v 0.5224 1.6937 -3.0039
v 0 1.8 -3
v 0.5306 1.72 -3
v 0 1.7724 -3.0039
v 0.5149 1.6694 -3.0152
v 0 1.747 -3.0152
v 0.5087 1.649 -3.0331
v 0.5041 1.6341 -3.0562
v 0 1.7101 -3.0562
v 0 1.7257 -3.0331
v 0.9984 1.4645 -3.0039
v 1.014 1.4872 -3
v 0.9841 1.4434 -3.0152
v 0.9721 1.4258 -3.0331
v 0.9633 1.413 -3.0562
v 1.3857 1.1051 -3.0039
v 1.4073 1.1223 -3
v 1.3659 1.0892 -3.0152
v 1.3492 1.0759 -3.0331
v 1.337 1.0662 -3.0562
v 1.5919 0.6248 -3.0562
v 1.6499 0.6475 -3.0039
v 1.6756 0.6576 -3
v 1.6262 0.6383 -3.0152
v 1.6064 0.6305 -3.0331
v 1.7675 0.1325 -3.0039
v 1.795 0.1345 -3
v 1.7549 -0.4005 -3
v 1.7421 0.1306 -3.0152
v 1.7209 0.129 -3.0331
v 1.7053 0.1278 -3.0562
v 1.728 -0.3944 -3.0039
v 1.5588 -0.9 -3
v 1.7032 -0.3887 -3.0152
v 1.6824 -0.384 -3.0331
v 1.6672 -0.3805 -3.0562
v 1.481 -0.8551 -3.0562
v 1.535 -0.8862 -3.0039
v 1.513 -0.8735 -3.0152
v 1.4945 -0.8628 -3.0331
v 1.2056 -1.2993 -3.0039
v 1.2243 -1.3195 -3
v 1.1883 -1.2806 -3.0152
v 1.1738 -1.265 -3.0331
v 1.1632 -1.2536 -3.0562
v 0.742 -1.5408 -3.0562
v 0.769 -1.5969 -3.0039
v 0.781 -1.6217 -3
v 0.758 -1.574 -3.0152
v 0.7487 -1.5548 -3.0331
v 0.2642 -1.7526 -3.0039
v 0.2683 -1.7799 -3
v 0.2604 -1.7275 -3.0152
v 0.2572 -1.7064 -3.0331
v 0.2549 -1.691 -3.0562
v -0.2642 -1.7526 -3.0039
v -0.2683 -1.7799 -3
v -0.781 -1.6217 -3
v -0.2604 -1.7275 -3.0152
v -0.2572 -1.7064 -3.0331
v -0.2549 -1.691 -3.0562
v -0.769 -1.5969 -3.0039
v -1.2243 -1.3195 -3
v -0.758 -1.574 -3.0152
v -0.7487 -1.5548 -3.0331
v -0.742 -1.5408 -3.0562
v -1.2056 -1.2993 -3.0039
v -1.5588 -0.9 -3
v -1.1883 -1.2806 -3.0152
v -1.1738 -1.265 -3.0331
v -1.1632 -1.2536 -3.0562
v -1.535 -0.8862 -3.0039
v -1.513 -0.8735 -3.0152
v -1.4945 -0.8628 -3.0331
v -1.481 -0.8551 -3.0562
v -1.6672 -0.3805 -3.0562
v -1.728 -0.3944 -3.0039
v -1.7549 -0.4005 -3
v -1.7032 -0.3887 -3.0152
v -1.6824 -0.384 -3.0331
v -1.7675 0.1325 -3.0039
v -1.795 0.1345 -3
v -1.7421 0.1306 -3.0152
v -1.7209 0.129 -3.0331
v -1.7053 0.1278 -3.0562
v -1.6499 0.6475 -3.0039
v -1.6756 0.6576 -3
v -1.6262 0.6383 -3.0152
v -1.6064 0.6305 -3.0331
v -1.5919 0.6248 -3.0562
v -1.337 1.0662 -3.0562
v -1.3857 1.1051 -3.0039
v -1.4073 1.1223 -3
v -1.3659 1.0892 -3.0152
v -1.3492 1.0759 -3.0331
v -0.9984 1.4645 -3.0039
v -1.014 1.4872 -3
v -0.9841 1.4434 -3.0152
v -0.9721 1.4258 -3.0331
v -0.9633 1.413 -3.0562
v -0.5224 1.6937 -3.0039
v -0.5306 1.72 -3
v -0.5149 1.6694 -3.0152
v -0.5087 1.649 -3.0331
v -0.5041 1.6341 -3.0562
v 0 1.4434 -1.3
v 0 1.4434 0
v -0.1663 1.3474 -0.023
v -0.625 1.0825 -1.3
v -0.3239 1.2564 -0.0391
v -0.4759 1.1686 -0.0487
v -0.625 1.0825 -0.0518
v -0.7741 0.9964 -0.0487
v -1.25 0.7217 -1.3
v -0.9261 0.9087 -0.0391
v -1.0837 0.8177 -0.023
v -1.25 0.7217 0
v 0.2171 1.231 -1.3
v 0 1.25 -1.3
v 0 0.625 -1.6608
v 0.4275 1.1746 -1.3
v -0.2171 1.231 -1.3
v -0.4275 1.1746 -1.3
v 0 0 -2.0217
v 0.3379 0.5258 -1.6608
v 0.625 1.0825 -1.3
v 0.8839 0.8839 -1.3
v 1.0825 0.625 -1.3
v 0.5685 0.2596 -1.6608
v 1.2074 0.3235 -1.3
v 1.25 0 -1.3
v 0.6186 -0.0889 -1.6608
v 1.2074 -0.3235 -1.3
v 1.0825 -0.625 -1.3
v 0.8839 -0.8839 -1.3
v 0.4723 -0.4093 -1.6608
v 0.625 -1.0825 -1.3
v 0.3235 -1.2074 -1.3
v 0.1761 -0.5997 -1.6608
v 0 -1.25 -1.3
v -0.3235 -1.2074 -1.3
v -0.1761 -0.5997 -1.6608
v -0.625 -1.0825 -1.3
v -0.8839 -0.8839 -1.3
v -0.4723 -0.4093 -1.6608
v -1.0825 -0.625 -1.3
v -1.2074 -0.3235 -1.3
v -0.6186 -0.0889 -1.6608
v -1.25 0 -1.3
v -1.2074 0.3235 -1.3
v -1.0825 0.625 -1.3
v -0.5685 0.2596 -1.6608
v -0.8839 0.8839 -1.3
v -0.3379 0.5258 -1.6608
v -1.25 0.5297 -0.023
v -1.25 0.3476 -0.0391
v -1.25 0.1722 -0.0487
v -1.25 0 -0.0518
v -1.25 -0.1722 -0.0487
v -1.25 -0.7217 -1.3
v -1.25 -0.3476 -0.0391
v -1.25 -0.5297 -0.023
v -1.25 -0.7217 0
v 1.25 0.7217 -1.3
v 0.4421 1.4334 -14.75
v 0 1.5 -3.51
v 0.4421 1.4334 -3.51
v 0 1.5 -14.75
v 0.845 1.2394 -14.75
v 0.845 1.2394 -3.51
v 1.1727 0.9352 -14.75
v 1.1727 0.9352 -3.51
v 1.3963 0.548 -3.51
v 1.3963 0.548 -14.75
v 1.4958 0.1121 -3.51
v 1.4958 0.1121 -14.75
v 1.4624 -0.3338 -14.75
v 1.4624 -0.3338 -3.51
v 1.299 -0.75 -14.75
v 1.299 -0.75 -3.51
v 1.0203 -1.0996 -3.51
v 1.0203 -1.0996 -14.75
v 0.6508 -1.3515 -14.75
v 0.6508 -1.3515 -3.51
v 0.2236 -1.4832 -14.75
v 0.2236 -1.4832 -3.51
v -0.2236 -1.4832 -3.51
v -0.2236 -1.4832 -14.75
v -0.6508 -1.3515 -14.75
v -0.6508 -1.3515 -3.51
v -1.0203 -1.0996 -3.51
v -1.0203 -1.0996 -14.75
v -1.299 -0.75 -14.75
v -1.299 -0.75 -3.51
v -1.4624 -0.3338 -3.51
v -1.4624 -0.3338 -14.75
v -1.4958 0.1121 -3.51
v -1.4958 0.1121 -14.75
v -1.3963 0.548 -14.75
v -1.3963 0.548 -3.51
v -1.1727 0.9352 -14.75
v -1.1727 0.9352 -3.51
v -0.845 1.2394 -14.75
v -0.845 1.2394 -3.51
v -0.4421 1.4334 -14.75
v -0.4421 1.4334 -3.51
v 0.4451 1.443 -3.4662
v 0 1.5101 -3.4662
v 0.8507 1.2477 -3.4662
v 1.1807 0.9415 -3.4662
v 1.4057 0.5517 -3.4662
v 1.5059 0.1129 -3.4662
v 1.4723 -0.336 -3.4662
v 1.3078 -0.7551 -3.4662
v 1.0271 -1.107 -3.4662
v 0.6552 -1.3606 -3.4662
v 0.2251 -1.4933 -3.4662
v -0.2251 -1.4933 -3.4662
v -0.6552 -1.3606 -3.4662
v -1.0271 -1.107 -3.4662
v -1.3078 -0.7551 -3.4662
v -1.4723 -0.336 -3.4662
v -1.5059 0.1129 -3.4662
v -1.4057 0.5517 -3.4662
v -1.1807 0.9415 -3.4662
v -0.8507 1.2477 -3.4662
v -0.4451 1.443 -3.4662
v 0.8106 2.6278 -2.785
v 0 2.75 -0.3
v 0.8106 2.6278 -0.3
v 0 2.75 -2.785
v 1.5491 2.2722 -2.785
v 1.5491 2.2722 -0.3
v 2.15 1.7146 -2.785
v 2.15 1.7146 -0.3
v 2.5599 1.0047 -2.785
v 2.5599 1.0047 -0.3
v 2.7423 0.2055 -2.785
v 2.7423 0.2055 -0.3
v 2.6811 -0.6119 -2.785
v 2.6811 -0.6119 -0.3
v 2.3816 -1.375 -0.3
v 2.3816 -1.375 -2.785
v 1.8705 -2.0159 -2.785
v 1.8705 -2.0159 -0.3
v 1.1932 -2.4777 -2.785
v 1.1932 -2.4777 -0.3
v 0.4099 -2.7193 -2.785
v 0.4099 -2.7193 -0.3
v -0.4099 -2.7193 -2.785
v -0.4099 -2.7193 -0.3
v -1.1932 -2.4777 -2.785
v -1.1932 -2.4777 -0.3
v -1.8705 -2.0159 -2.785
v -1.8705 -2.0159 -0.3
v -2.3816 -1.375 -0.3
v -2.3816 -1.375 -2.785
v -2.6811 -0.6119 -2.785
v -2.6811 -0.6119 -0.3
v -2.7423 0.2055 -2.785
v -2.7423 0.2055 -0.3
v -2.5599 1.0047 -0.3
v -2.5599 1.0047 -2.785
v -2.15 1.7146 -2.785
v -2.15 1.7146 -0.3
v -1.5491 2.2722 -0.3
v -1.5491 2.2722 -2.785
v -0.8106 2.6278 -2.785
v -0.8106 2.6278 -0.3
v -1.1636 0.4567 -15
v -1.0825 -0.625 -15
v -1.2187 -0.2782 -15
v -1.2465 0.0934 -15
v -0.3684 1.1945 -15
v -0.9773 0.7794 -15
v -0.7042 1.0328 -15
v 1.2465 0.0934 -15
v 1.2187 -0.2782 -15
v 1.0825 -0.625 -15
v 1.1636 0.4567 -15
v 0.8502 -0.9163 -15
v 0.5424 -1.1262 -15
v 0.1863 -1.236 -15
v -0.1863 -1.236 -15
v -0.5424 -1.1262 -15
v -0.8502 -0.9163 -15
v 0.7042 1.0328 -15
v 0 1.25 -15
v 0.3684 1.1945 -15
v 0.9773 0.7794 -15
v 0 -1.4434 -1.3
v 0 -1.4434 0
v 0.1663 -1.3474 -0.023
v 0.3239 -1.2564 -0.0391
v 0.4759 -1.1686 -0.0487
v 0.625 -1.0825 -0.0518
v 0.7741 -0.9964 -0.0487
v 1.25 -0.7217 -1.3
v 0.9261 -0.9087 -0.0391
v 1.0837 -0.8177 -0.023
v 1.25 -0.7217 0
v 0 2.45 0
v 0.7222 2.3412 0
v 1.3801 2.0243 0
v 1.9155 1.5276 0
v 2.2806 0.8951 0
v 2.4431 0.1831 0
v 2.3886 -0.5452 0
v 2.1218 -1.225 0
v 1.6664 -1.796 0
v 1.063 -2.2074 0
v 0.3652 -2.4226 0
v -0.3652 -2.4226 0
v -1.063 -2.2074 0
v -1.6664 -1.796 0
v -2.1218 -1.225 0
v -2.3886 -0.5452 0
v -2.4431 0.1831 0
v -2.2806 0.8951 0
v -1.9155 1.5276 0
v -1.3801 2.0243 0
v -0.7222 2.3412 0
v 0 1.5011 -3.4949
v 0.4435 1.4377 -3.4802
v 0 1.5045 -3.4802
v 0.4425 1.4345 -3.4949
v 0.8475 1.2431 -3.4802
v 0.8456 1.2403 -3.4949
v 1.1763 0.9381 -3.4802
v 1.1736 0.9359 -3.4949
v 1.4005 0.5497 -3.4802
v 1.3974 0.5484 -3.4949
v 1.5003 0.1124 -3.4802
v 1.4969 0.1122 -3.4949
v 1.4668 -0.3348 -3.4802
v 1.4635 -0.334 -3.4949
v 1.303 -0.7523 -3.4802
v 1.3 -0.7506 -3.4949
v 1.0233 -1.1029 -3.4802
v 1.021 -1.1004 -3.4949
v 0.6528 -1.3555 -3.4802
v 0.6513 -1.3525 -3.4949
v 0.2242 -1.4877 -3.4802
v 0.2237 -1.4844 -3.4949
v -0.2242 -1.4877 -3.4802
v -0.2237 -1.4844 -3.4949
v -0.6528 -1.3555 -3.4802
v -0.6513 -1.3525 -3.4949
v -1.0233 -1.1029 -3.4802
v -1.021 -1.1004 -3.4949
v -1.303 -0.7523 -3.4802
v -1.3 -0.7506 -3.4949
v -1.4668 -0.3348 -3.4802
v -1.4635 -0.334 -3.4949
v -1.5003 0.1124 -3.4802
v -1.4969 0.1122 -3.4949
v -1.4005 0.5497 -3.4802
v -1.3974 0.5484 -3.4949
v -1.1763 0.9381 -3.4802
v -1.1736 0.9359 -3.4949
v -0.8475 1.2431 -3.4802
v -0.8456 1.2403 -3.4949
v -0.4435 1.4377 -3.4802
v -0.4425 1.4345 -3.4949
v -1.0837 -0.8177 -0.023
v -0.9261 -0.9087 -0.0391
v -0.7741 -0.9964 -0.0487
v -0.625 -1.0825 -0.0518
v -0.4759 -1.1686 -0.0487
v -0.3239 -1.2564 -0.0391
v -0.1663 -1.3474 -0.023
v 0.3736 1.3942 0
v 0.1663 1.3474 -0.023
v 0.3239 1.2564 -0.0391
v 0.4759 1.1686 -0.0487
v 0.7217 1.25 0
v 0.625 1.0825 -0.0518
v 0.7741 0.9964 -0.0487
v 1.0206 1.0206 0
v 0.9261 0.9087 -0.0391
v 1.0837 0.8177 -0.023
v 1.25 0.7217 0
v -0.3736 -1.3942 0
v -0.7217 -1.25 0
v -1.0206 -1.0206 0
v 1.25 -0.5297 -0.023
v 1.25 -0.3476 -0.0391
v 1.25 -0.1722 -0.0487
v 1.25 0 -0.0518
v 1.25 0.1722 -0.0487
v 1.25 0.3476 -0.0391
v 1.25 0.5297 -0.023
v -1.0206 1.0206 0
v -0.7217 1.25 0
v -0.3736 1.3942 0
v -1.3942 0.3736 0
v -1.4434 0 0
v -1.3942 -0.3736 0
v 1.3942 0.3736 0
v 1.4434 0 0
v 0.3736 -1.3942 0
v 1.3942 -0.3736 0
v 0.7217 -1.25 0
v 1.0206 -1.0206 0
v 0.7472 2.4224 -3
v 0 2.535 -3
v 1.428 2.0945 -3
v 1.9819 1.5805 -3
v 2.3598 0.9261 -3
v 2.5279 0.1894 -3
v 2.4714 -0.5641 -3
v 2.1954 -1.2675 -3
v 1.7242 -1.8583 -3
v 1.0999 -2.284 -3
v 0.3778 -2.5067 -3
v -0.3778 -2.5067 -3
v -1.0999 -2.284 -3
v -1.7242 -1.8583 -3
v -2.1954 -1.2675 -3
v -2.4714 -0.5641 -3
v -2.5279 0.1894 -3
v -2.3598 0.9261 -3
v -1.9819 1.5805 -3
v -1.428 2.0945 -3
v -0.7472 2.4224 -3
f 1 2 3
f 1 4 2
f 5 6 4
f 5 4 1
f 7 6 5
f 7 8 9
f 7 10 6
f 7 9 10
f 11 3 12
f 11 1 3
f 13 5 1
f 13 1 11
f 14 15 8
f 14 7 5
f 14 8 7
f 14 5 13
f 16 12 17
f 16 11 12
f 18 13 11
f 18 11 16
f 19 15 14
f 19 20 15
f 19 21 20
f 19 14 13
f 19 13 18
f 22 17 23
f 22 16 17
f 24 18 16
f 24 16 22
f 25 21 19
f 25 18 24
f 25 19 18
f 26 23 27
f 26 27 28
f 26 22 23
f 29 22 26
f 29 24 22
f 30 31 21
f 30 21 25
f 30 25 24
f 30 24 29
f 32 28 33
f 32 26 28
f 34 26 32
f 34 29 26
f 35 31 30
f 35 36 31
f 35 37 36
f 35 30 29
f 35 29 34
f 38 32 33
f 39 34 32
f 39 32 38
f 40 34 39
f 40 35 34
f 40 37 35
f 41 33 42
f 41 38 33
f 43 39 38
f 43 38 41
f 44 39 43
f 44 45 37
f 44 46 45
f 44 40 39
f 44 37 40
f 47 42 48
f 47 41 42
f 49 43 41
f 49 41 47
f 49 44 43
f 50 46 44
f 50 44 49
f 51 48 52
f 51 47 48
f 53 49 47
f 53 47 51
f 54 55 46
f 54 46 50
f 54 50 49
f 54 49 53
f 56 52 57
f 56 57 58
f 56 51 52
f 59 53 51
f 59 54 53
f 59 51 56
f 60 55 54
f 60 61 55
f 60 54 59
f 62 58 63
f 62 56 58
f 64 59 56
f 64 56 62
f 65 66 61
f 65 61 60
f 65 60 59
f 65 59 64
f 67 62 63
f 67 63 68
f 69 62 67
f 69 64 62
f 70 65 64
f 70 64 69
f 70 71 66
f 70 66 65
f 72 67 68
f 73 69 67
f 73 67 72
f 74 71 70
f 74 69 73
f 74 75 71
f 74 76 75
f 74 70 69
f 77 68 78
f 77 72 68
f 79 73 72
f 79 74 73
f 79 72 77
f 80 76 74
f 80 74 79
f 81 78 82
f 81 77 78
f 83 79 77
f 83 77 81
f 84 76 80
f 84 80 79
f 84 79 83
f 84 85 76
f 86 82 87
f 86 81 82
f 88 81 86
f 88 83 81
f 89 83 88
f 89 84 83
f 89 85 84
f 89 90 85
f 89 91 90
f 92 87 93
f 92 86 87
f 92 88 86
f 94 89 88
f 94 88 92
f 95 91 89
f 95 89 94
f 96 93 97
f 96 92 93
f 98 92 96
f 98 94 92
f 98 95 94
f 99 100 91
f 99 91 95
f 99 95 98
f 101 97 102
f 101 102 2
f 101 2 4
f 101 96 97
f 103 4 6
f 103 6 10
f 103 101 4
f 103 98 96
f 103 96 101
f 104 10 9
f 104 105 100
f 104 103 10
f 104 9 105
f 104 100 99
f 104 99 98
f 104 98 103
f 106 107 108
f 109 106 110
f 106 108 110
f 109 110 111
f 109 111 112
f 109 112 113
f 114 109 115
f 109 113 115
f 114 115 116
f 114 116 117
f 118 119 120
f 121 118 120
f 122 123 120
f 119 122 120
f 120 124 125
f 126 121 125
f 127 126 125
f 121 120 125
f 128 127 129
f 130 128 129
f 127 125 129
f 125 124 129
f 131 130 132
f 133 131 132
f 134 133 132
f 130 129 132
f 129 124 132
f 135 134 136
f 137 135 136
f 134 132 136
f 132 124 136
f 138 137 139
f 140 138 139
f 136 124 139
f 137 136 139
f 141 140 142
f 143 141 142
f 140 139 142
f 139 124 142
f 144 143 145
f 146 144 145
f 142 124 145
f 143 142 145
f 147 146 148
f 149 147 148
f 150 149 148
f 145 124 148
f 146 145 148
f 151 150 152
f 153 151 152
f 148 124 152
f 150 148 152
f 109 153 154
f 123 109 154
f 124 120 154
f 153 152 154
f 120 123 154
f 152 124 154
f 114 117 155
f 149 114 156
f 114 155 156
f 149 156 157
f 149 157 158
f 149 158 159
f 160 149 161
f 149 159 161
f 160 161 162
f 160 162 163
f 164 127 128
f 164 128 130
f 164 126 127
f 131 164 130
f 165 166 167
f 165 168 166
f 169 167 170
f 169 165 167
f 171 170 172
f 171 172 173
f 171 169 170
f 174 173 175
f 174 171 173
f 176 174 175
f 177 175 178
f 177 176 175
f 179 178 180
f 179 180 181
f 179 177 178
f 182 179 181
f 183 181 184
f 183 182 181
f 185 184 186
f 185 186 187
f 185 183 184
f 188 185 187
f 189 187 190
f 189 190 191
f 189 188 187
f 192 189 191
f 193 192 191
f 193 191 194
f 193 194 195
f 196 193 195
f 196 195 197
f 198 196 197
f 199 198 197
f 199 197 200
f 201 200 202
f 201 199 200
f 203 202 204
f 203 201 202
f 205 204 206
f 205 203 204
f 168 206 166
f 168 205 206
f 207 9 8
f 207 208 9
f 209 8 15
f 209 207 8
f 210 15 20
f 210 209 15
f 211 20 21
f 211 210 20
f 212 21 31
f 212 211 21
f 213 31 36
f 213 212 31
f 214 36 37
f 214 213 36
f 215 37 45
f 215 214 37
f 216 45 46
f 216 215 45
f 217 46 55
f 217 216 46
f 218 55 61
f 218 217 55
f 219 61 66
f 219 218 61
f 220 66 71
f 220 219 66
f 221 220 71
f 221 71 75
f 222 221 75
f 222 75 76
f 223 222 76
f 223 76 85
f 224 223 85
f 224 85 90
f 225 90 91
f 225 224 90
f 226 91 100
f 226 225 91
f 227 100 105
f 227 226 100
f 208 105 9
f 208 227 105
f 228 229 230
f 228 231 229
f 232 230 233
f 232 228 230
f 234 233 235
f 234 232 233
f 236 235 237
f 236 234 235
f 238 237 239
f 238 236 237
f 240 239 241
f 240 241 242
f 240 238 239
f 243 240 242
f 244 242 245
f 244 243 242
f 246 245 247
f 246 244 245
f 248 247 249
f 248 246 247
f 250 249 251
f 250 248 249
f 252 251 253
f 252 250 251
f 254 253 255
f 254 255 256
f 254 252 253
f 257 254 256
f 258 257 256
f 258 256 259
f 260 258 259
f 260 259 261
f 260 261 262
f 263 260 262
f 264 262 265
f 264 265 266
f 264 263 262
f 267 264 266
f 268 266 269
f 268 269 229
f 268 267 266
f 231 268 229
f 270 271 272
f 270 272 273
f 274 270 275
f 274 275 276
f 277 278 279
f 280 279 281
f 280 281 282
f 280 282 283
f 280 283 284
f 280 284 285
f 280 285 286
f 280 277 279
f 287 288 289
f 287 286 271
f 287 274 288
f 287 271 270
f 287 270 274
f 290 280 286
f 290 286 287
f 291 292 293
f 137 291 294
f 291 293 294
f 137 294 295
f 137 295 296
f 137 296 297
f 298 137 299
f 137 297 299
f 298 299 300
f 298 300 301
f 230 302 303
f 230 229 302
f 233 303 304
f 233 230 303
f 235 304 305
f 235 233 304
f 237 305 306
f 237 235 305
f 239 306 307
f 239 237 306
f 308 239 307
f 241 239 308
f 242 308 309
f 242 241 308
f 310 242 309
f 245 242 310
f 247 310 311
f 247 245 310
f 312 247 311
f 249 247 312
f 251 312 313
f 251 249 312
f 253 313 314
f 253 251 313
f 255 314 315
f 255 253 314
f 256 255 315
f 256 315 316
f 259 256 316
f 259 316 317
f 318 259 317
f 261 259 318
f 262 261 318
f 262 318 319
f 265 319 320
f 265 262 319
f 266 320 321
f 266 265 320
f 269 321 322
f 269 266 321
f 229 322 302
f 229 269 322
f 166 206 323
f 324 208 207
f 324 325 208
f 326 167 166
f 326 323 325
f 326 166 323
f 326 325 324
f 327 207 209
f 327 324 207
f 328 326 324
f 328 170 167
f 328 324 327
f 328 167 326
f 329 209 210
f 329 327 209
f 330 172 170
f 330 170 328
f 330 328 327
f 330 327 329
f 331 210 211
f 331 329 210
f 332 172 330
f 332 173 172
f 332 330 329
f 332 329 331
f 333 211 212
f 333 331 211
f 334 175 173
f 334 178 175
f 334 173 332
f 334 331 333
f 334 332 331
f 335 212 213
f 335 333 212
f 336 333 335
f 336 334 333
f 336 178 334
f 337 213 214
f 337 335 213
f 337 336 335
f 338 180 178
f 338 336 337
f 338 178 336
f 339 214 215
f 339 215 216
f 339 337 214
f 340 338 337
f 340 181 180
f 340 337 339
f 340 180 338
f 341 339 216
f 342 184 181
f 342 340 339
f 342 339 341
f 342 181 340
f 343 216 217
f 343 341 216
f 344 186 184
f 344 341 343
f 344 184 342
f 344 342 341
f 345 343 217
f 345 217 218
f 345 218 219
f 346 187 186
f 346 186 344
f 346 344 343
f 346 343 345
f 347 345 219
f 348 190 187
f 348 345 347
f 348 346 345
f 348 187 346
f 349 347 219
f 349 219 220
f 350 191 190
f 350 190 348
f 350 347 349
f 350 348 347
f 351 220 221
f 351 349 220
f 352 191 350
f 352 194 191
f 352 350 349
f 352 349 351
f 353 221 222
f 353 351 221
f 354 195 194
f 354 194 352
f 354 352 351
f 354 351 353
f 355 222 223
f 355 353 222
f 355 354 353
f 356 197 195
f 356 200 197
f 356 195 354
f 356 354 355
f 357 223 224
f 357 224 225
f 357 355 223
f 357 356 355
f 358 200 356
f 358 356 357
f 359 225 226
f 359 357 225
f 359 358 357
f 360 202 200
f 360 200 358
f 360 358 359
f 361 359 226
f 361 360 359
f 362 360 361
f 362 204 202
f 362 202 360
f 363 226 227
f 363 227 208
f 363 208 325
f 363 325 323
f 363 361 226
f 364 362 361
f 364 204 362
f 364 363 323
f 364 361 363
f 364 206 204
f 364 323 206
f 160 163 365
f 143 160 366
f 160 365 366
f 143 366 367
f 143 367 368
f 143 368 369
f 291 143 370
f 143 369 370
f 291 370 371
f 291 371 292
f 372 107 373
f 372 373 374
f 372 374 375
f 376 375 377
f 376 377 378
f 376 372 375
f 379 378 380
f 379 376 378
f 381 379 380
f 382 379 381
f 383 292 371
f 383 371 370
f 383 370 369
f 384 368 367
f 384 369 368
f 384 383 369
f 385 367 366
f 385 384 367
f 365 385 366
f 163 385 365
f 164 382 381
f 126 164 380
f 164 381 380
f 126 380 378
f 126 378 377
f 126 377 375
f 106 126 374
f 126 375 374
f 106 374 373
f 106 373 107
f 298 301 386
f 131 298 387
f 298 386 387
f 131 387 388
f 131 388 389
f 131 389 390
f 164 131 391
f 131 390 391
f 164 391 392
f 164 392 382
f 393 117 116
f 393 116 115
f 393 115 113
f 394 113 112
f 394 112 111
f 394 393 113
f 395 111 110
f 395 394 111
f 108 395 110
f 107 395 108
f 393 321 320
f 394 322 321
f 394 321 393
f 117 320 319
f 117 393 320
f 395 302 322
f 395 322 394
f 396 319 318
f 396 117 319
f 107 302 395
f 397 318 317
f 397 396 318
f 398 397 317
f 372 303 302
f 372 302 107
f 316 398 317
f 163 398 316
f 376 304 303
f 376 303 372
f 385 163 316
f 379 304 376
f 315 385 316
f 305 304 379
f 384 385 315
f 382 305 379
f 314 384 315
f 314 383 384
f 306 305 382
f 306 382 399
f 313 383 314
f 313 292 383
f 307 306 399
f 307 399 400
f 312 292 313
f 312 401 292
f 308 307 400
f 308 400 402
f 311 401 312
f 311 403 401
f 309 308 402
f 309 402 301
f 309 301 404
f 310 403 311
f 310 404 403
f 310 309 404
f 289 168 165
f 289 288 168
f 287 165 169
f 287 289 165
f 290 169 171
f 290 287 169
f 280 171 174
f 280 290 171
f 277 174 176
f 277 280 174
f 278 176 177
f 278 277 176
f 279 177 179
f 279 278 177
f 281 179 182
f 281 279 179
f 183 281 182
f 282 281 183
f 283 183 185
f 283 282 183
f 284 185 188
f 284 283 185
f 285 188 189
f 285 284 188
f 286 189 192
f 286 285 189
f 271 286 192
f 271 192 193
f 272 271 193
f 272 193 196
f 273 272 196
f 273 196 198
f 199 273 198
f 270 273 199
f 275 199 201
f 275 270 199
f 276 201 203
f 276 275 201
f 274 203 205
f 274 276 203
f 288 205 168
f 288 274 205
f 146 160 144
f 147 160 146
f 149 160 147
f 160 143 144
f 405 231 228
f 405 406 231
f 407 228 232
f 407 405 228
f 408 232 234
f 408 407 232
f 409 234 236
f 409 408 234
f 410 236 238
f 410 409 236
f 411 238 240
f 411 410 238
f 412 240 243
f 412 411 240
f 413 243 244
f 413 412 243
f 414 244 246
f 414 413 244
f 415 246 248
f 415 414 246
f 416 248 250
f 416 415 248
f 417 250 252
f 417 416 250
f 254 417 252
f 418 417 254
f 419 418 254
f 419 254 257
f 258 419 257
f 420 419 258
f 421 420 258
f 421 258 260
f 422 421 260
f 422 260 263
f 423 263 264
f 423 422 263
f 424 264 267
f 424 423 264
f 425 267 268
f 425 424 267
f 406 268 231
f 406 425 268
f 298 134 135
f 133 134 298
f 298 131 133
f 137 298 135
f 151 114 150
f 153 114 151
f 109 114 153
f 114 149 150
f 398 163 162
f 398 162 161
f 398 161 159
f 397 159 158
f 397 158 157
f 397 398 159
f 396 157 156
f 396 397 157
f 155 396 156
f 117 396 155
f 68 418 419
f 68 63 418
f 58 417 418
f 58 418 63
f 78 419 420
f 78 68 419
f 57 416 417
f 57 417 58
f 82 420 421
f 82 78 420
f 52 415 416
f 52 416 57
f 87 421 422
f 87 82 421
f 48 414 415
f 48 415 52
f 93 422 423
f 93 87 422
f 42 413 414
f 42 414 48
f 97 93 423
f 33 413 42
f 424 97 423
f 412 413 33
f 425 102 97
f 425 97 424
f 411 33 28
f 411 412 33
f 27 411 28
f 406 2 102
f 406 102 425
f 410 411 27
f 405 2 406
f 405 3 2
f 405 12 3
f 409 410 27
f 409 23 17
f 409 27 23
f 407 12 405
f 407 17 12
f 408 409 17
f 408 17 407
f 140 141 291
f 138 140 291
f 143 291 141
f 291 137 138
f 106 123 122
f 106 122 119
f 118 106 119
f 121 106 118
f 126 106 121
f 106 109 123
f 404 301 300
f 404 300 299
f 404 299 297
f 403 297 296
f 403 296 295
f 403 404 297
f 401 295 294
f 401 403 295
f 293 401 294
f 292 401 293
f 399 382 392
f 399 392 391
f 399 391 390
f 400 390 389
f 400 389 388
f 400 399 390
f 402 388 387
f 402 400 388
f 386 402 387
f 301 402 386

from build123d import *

# Parameters (mm, degrees)
CUT_EXTRUDE1_DEPTH = 1.3


with BuildPart() as part:
    # Sketch1 → Revolve1 (revolve)
    with BuildSketch(Plane(origin=(0, 0, 0), x_dir=(0, 0, -1), z_dir=(1, 0, 0))):
        with BuildLine():
            Line((0, 0), (0, 2.45))
            Line((0, 2.45), (0.3, 2.75))
            Line((0.3, 2.75), (2.785, 2.75))
            Line((2.785, 2.75), (3, 2.535))
            Line((3, 2.535), (3, 1.8))
            ThreePointArc((3, 1.8), (3.015193643, 1.74701055), (3.056157637, 1.710123155))
            Line((3.056157637, 1.710123155), (3.466157637, 1.510123155))
            ThreePointArc((3.466157637, 1.510123155), (3.48750205, 1.50256365), (3.51, 1.5))
            Line((3.51, 1.5), (14.75, 1.5))
            Line((14.75, 1.5), (15, 1.25))
            Line((15, 1.25), (15, 0))
            Line((15, 0), (0, 0))
        make_face()
    revolve(axis=Axis((0, 0, 0), (0, 0, -1)))

    # Sketch2 → Cut-Extrude1 (cut)
    with BuildSketch(Plane.XY):
        Polygon((0, 1.443375673), (-1.25, 0.721687836), (-1.25, -0.721687836), (0, -1.443375673), (1.25, -0.721687836), (1.25, 0.721687836), align=None)
    extrude(amount=-CUT_EXTRUDE1_DEPTH, mode=Mode.SUBTRACT)

    # Sketch3 → Cut-Revolve2 (revolve, cut)
    with BuildSketch(Plane(origin=(0, 0, 0), x_dir=(0, 0, -1), z_dir=(1, 0, 0))):
        Polygon((1.3, 0), (1.3, 1.25), (2.021687836, 0), align=None)
    revolve(axis=Axis((0, 0, -1.3), (0, 0, -1)), mode=Mode.SUBTRACT)

    # Sketch4 → Cut-Revolve3 (revolve, cut)
    with BuildSketch(Plane(origin=(0, 0, 0), x_dir=(0, 0, -1), z_dir=(1, 0, 0))):
        Polygon((0, 1.443375673), (0, 1.25), (0.051814855, 1.25), align=None)
    revolve(axis=Axis((0, 0, 0), (0, 0, -1)), mode=Mode.SUBTRACT)


solid = part.part
